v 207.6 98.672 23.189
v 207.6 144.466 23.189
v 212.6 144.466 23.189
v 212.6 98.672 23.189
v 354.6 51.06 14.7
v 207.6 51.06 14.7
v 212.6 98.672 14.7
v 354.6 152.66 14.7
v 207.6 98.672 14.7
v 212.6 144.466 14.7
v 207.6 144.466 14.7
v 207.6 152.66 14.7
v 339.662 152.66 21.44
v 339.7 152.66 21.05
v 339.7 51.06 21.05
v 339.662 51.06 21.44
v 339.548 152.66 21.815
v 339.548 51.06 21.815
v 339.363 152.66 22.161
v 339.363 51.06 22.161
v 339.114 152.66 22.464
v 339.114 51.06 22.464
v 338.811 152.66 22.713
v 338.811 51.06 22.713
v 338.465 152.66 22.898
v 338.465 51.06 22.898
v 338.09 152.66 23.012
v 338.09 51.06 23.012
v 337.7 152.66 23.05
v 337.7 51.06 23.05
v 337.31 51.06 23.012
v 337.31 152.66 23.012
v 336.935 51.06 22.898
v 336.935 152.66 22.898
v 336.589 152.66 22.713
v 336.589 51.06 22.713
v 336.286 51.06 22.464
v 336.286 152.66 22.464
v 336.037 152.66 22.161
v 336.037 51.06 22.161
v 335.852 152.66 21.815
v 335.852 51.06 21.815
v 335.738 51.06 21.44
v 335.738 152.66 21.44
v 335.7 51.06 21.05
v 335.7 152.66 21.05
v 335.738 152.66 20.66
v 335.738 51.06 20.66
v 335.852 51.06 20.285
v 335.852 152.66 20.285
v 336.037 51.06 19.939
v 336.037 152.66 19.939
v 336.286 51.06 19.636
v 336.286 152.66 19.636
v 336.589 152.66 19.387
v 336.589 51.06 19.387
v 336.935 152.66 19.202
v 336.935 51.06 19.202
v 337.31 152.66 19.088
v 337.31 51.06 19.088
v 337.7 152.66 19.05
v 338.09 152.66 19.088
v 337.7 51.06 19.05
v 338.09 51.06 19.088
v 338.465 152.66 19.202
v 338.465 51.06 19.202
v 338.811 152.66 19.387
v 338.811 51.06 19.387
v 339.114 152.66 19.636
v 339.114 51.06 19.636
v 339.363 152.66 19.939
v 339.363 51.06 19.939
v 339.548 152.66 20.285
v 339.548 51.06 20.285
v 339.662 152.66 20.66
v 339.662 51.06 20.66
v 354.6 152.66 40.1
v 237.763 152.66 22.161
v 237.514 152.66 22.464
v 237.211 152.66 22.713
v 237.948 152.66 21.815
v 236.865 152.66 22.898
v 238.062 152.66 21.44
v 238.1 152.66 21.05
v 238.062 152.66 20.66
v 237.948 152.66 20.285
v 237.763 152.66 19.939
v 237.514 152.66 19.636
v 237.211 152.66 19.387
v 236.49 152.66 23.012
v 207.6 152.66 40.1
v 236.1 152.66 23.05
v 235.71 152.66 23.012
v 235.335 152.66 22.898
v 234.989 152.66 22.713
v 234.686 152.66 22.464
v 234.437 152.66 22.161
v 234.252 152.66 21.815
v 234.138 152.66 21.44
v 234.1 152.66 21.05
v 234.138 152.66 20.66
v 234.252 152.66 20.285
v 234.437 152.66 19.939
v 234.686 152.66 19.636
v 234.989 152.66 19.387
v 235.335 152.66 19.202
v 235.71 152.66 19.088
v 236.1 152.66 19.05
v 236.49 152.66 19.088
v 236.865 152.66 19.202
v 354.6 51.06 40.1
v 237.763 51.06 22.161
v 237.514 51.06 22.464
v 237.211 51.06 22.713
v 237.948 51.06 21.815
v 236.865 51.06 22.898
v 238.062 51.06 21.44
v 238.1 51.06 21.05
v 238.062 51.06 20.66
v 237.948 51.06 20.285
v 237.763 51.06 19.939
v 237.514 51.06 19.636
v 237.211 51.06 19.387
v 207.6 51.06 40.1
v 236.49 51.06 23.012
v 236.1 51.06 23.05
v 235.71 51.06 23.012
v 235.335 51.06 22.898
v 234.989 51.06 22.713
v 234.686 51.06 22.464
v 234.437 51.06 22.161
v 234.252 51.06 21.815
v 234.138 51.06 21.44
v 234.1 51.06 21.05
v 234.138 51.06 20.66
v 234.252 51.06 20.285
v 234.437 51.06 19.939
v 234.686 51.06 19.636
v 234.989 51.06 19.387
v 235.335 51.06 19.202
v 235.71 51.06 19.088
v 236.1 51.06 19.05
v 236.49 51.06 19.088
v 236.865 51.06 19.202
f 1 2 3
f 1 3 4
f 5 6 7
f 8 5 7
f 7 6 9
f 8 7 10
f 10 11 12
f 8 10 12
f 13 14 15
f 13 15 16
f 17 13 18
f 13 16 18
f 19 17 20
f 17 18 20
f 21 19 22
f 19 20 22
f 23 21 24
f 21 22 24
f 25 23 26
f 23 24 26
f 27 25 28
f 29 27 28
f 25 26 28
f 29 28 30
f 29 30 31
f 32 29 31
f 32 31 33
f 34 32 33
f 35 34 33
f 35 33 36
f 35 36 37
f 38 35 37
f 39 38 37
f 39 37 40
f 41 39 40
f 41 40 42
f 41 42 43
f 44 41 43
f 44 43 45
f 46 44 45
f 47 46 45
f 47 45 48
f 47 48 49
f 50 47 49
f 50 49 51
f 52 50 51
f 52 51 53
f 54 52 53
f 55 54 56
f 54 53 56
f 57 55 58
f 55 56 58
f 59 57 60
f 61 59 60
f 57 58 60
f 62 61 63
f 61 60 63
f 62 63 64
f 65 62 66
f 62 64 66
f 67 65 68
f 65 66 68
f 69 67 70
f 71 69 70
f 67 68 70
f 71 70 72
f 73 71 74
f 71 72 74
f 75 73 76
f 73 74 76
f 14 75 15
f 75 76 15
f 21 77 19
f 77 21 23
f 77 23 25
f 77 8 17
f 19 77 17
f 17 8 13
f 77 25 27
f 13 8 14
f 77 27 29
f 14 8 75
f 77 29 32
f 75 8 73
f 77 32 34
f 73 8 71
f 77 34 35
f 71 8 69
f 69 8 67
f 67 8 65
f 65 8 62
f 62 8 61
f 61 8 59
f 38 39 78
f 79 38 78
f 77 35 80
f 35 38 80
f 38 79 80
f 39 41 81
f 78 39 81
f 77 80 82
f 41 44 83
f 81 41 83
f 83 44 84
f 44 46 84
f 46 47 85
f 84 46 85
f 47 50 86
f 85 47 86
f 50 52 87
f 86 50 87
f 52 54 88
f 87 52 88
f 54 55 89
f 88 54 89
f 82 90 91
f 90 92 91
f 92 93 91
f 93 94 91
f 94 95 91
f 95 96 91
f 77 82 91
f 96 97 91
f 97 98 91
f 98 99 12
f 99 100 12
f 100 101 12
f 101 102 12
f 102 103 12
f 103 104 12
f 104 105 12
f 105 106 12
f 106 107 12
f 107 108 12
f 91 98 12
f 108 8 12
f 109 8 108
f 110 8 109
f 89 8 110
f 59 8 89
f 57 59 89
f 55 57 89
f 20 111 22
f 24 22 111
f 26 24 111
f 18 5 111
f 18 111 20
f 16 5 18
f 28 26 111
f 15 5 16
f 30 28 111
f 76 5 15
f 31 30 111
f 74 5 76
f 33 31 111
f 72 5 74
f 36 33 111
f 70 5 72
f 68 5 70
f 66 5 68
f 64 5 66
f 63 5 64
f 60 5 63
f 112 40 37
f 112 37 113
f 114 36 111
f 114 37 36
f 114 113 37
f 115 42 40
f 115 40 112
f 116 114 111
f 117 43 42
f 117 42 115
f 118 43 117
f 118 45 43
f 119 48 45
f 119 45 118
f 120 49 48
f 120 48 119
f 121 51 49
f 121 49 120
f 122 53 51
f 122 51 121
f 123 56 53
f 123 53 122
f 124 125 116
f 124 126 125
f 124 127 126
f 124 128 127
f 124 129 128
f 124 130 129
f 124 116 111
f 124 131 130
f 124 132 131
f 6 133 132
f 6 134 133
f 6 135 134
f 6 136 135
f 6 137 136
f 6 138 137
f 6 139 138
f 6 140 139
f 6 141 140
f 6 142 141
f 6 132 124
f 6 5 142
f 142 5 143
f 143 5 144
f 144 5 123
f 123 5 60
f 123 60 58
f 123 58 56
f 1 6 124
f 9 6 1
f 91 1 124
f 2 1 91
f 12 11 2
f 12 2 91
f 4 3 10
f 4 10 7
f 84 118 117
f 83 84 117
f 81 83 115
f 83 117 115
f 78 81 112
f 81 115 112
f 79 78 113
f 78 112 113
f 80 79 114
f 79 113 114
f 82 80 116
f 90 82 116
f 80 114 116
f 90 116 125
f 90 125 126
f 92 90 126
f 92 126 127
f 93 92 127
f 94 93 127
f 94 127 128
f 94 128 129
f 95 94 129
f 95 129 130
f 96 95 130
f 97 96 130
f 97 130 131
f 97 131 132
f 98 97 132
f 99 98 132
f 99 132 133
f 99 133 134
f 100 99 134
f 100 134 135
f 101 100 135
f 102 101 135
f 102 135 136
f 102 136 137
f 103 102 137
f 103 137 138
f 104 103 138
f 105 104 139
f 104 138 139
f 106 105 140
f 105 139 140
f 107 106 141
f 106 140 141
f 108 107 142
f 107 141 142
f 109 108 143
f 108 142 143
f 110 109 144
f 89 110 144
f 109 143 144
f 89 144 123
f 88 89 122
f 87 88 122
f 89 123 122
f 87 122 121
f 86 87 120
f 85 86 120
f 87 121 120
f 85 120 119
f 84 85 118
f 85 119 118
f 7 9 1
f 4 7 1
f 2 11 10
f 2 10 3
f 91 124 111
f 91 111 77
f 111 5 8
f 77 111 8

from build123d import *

# Parameters (mm, degrees)
SKETCH075_W             = 101.6
SKETCH075_H             = 147
PAD026_DEPTH            = 25.4
SKETCH076_W             = 45.794352
SKETCH076_H             = 8.488647
POCKET024_DEPTH         = 5
SKETCH077_R             = 2
POCKET025_DEPTH         = 101.601
BODY015_PLACEMENT_ANGLE = 90


with BuildPart() as part:
    # Sketch075 → Pad026 (new body)
    with BuildSketch(Plane.XY):
        Rectangle(SKETCH075_W, SKETCH075_H)
    extrude(amount=PAD026_DEPTH)

    # Sketch076 (on Face3 of Pad026) → Pocket024 (cut)
    with BuildSketch(Plane(origin=(0, 73.5, 0), x_dir=(-1, 0, 0), z_dir=(0, 1, 0))):
        with Locations((-19.708751, 4.2443235)):
            Rectangle(SKETCH076_W, SKETCH076_H)
    extrude(amount=-POCKET024_DEPTH, mode=Mode.SUBTRACT)

    # Sketch077 (on Face2 of Pocket024) → Pocket025 (cut, through all)
    with BuildSketch(Plane(origin=(-50.8, 0, 0), x_dir=(0, -1, 0), z_dir=(-1, 0, 0))):
        with Locations((-45, 6.35)):
            Circle(SKETCH077_R)
        with Locations((56.6, 6.35)):
            Circle(SKETCH077_R)
    extrude(amount=-POCKET025_DEPTH, mode=Mode.SUBTRACT)


with BuildPart() as part_1:
    # Body015 placement: moved
    add(part.part.moved(Location((281.1, 101.86, 14.7))).rotate(Axis((281.1, 101.86, 14.7), (0, 0, 1)), BODY015_PLACEMENT_ANGLE))


solid = part_1.part
